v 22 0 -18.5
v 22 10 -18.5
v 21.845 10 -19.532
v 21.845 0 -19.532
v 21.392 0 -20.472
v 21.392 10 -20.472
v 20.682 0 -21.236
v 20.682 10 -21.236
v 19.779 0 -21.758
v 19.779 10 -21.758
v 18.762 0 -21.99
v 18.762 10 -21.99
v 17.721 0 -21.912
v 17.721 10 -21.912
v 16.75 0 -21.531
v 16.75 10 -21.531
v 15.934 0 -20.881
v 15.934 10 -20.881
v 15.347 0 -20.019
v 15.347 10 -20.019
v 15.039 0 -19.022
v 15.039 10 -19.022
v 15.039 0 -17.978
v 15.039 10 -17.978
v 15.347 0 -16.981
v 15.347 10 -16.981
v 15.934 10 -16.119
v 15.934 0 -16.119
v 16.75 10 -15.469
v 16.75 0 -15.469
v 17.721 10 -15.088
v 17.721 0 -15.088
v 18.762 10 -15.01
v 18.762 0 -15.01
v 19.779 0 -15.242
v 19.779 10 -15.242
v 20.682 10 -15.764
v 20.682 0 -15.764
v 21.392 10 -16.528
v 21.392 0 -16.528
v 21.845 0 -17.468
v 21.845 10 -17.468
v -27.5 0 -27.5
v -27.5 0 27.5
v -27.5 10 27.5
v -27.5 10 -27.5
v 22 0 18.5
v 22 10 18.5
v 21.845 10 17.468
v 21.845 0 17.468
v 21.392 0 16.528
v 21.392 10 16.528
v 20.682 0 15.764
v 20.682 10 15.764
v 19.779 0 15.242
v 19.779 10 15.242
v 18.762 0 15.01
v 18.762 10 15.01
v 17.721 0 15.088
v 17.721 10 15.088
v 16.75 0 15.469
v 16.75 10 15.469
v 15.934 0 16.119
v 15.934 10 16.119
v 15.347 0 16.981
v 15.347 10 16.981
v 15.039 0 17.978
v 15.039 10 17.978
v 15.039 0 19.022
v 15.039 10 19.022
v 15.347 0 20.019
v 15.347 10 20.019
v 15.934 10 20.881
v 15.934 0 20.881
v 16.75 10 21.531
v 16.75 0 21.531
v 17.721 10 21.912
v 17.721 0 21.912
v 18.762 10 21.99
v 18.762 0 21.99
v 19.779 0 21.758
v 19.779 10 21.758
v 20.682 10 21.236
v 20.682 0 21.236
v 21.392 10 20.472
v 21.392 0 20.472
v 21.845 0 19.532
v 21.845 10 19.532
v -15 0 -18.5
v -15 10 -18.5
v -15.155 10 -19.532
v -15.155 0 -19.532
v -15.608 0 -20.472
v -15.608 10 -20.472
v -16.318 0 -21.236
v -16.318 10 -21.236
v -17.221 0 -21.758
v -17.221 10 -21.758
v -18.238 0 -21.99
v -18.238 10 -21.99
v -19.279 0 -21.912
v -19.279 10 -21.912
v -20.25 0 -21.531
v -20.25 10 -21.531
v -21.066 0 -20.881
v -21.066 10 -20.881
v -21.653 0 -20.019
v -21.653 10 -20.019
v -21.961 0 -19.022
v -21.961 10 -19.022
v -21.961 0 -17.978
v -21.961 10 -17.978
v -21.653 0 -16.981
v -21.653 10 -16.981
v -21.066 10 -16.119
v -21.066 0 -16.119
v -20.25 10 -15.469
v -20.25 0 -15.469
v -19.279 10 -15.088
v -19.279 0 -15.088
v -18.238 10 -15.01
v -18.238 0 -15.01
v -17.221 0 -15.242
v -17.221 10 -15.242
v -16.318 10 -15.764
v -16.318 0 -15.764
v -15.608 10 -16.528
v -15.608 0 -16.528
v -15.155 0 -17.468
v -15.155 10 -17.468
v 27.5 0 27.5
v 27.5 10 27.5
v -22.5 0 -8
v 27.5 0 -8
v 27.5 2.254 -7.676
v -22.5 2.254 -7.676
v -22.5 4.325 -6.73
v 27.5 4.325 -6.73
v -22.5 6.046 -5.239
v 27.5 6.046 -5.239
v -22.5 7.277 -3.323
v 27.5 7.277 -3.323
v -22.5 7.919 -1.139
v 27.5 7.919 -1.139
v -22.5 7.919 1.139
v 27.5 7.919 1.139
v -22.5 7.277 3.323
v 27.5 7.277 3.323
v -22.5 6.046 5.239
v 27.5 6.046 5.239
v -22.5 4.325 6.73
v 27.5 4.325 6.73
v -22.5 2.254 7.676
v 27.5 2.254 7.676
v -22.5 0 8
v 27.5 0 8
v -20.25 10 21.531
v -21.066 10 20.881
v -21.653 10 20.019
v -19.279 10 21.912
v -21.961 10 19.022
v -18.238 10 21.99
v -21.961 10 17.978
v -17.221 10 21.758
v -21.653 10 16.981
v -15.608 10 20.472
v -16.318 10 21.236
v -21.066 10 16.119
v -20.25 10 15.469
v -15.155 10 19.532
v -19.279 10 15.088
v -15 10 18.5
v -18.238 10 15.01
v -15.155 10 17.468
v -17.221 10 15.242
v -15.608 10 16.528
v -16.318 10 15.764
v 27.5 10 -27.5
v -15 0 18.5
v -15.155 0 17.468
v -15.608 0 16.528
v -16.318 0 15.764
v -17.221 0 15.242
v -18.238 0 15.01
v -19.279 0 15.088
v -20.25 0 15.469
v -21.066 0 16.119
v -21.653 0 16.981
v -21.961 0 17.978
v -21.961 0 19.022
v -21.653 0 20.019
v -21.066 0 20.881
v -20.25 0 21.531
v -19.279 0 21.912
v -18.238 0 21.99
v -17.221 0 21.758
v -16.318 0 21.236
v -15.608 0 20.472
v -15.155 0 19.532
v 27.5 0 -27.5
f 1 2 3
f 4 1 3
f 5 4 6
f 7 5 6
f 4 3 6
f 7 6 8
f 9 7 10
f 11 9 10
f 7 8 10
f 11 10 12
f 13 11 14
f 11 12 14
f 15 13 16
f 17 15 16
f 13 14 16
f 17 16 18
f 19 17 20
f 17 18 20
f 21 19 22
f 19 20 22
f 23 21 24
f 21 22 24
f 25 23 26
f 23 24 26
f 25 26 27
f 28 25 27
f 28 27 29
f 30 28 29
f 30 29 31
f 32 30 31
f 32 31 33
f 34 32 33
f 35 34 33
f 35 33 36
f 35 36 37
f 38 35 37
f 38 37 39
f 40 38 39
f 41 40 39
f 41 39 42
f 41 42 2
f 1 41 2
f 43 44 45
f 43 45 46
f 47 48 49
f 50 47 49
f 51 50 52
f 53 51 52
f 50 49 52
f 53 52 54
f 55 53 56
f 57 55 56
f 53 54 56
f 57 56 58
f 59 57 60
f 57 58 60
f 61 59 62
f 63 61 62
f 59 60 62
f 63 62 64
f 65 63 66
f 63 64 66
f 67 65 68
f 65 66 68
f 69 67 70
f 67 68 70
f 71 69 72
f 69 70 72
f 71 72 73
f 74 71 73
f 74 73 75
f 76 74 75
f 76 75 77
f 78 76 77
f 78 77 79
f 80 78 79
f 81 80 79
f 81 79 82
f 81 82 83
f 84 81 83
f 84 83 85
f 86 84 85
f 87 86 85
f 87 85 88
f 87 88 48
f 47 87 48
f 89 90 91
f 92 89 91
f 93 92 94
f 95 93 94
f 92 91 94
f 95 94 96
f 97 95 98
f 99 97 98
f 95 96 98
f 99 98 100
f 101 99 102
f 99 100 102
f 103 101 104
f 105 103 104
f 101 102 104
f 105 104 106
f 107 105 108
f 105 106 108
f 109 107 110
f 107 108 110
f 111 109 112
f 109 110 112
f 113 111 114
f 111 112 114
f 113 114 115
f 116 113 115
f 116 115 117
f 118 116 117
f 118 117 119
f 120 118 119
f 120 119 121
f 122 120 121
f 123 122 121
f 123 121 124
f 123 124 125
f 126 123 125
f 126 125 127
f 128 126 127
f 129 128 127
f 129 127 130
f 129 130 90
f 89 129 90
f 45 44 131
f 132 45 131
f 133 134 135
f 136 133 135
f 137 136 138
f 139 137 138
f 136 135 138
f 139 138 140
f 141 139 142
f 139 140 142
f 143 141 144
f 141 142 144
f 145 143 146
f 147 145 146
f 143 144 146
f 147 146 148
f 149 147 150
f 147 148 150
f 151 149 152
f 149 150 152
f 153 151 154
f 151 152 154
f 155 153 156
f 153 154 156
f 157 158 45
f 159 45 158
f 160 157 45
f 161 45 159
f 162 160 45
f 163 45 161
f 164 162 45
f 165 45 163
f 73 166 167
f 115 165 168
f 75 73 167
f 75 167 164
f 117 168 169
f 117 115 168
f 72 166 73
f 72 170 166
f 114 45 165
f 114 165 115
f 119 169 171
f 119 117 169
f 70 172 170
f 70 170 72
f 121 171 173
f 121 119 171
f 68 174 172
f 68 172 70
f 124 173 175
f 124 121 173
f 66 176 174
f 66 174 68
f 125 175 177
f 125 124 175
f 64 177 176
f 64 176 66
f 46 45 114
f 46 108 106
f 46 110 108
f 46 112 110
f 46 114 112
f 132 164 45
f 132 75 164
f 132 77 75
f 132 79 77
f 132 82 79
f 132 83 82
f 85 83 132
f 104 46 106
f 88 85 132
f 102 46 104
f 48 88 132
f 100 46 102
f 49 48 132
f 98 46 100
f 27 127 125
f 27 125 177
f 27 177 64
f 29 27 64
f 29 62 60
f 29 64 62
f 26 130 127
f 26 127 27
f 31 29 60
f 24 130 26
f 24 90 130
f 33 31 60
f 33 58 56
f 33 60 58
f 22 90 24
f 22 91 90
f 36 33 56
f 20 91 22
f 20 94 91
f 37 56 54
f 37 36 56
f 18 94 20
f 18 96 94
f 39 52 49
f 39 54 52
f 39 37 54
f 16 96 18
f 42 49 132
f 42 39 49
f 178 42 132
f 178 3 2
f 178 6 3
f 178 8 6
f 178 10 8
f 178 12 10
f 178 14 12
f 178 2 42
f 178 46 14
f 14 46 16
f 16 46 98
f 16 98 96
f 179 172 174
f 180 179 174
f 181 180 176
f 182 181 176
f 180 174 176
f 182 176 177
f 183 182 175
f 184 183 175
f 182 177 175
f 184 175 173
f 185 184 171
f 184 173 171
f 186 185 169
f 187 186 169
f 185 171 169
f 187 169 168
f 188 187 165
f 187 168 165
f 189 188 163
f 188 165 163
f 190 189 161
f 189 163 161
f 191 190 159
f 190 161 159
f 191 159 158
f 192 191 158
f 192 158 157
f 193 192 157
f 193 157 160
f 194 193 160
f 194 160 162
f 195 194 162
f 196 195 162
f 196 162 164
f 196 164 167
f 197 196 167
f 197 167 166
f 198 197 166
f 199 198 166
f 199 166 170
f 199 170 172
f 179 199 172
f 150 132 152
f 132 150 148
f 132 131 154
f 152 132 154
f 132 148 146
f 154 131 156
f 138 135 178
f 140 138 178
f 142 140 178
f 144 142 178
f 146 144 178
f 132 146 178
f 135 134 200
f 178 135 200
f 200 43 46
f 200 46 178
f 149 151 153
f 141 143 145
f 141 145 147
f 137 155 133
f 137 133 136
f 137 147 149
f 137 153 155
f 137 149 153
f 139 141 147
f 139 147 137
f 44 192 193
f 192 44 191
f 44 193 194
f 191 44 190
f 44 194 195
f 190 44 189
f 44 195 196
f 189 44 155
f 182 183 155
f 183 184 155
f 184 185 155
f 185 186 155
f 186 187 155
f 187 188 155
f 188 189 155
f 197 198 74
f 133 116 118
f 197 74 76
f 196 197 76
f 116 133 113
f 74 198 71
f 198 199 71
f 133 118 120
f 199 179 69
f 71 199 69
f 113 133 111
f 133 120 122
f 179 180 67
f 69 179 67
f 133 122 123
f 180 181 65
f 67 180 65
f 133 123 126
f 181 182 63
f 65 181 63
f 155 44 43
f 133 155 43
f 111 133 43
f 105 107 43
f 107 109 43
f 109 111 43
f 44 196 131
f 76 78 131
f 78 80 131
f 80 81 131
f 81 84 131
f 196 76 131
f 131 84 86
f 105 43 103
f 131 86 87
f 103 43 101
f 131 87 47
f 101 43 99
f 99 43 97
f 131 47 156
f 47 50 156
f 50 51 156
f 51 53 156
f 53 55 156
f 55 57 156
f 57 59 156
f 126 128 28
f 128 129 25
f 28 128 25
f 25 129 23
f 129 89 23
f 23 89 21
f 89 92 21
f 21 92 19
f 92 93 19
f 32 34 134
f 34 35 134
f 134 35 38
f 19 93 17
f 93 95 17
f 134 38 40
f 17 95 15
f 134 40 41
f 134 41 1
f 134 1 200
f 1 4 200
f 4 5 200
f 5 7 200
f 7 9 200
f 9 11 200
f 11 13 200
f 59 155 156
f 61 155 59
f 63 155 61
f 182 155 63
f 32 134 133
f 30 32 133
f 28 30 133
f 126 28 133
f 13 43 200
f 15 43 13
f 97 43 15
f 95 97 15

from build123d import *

# Parameters (mm, degrees)
SKETCH1_W           = 55
SKETCH1_H           = 55
BOSS_EXTRUDE1_DEPTH = 10
SKETCH2_R           = 8
CUT_EXTRUDE1_DEPTH  = 50
SKETCH3_R           = 3.5
CUT_EXTRUDE2_DEPTH  = 50


with BuildPart() as part:
    # Sketch1 → Boss-Extrude1 (new body)
    with BuildSketch(Plane(origin=(0, 0, 0), x_dir=(1, 0, 0), z_dir=(0, 1, 0))):
        Rectangle(SKETCH1_W, SKETCH1_H)
    extrude(amount=BOSS_EXTRUDE1_DEPTH)

    # Sketch2 → Cut-Extrude1 (cut)
    with BuildSketch(Plane(origin=(27.5, 0, 0), x_dir=(0, 0, -1), z_dir=(1, 0, 0))):
        Circle(SKETCH2_R)
    extrude(amount=-CUT_EXTRUDE1_DEPTH, mode=Mode.SUBTRACT)

    # Sketch3 → Cut-Extrude2 (cut)
    with BuildSketch(Plane(origin=(0, 10, 0), x_dir=(1, 0, 0), z_dir=(0, 1, 0))):
        with Locations((-18.5, 18.5)):
            Circle(SKETCH3_R)
        with Locations((18.5, 18.5)):
            Circle(SKETCH3_R)
        with Locations((-18.5, -18.5)):
            Circle(SKETCH3_R)
        with Locations((18.5, -18.5)):
            Circle(SKETCH3_R)
    extrude(amount=-CUT_EXTRUDE2_DEPTH, mode=Mode.SUBTRACT)


solid = part.part
